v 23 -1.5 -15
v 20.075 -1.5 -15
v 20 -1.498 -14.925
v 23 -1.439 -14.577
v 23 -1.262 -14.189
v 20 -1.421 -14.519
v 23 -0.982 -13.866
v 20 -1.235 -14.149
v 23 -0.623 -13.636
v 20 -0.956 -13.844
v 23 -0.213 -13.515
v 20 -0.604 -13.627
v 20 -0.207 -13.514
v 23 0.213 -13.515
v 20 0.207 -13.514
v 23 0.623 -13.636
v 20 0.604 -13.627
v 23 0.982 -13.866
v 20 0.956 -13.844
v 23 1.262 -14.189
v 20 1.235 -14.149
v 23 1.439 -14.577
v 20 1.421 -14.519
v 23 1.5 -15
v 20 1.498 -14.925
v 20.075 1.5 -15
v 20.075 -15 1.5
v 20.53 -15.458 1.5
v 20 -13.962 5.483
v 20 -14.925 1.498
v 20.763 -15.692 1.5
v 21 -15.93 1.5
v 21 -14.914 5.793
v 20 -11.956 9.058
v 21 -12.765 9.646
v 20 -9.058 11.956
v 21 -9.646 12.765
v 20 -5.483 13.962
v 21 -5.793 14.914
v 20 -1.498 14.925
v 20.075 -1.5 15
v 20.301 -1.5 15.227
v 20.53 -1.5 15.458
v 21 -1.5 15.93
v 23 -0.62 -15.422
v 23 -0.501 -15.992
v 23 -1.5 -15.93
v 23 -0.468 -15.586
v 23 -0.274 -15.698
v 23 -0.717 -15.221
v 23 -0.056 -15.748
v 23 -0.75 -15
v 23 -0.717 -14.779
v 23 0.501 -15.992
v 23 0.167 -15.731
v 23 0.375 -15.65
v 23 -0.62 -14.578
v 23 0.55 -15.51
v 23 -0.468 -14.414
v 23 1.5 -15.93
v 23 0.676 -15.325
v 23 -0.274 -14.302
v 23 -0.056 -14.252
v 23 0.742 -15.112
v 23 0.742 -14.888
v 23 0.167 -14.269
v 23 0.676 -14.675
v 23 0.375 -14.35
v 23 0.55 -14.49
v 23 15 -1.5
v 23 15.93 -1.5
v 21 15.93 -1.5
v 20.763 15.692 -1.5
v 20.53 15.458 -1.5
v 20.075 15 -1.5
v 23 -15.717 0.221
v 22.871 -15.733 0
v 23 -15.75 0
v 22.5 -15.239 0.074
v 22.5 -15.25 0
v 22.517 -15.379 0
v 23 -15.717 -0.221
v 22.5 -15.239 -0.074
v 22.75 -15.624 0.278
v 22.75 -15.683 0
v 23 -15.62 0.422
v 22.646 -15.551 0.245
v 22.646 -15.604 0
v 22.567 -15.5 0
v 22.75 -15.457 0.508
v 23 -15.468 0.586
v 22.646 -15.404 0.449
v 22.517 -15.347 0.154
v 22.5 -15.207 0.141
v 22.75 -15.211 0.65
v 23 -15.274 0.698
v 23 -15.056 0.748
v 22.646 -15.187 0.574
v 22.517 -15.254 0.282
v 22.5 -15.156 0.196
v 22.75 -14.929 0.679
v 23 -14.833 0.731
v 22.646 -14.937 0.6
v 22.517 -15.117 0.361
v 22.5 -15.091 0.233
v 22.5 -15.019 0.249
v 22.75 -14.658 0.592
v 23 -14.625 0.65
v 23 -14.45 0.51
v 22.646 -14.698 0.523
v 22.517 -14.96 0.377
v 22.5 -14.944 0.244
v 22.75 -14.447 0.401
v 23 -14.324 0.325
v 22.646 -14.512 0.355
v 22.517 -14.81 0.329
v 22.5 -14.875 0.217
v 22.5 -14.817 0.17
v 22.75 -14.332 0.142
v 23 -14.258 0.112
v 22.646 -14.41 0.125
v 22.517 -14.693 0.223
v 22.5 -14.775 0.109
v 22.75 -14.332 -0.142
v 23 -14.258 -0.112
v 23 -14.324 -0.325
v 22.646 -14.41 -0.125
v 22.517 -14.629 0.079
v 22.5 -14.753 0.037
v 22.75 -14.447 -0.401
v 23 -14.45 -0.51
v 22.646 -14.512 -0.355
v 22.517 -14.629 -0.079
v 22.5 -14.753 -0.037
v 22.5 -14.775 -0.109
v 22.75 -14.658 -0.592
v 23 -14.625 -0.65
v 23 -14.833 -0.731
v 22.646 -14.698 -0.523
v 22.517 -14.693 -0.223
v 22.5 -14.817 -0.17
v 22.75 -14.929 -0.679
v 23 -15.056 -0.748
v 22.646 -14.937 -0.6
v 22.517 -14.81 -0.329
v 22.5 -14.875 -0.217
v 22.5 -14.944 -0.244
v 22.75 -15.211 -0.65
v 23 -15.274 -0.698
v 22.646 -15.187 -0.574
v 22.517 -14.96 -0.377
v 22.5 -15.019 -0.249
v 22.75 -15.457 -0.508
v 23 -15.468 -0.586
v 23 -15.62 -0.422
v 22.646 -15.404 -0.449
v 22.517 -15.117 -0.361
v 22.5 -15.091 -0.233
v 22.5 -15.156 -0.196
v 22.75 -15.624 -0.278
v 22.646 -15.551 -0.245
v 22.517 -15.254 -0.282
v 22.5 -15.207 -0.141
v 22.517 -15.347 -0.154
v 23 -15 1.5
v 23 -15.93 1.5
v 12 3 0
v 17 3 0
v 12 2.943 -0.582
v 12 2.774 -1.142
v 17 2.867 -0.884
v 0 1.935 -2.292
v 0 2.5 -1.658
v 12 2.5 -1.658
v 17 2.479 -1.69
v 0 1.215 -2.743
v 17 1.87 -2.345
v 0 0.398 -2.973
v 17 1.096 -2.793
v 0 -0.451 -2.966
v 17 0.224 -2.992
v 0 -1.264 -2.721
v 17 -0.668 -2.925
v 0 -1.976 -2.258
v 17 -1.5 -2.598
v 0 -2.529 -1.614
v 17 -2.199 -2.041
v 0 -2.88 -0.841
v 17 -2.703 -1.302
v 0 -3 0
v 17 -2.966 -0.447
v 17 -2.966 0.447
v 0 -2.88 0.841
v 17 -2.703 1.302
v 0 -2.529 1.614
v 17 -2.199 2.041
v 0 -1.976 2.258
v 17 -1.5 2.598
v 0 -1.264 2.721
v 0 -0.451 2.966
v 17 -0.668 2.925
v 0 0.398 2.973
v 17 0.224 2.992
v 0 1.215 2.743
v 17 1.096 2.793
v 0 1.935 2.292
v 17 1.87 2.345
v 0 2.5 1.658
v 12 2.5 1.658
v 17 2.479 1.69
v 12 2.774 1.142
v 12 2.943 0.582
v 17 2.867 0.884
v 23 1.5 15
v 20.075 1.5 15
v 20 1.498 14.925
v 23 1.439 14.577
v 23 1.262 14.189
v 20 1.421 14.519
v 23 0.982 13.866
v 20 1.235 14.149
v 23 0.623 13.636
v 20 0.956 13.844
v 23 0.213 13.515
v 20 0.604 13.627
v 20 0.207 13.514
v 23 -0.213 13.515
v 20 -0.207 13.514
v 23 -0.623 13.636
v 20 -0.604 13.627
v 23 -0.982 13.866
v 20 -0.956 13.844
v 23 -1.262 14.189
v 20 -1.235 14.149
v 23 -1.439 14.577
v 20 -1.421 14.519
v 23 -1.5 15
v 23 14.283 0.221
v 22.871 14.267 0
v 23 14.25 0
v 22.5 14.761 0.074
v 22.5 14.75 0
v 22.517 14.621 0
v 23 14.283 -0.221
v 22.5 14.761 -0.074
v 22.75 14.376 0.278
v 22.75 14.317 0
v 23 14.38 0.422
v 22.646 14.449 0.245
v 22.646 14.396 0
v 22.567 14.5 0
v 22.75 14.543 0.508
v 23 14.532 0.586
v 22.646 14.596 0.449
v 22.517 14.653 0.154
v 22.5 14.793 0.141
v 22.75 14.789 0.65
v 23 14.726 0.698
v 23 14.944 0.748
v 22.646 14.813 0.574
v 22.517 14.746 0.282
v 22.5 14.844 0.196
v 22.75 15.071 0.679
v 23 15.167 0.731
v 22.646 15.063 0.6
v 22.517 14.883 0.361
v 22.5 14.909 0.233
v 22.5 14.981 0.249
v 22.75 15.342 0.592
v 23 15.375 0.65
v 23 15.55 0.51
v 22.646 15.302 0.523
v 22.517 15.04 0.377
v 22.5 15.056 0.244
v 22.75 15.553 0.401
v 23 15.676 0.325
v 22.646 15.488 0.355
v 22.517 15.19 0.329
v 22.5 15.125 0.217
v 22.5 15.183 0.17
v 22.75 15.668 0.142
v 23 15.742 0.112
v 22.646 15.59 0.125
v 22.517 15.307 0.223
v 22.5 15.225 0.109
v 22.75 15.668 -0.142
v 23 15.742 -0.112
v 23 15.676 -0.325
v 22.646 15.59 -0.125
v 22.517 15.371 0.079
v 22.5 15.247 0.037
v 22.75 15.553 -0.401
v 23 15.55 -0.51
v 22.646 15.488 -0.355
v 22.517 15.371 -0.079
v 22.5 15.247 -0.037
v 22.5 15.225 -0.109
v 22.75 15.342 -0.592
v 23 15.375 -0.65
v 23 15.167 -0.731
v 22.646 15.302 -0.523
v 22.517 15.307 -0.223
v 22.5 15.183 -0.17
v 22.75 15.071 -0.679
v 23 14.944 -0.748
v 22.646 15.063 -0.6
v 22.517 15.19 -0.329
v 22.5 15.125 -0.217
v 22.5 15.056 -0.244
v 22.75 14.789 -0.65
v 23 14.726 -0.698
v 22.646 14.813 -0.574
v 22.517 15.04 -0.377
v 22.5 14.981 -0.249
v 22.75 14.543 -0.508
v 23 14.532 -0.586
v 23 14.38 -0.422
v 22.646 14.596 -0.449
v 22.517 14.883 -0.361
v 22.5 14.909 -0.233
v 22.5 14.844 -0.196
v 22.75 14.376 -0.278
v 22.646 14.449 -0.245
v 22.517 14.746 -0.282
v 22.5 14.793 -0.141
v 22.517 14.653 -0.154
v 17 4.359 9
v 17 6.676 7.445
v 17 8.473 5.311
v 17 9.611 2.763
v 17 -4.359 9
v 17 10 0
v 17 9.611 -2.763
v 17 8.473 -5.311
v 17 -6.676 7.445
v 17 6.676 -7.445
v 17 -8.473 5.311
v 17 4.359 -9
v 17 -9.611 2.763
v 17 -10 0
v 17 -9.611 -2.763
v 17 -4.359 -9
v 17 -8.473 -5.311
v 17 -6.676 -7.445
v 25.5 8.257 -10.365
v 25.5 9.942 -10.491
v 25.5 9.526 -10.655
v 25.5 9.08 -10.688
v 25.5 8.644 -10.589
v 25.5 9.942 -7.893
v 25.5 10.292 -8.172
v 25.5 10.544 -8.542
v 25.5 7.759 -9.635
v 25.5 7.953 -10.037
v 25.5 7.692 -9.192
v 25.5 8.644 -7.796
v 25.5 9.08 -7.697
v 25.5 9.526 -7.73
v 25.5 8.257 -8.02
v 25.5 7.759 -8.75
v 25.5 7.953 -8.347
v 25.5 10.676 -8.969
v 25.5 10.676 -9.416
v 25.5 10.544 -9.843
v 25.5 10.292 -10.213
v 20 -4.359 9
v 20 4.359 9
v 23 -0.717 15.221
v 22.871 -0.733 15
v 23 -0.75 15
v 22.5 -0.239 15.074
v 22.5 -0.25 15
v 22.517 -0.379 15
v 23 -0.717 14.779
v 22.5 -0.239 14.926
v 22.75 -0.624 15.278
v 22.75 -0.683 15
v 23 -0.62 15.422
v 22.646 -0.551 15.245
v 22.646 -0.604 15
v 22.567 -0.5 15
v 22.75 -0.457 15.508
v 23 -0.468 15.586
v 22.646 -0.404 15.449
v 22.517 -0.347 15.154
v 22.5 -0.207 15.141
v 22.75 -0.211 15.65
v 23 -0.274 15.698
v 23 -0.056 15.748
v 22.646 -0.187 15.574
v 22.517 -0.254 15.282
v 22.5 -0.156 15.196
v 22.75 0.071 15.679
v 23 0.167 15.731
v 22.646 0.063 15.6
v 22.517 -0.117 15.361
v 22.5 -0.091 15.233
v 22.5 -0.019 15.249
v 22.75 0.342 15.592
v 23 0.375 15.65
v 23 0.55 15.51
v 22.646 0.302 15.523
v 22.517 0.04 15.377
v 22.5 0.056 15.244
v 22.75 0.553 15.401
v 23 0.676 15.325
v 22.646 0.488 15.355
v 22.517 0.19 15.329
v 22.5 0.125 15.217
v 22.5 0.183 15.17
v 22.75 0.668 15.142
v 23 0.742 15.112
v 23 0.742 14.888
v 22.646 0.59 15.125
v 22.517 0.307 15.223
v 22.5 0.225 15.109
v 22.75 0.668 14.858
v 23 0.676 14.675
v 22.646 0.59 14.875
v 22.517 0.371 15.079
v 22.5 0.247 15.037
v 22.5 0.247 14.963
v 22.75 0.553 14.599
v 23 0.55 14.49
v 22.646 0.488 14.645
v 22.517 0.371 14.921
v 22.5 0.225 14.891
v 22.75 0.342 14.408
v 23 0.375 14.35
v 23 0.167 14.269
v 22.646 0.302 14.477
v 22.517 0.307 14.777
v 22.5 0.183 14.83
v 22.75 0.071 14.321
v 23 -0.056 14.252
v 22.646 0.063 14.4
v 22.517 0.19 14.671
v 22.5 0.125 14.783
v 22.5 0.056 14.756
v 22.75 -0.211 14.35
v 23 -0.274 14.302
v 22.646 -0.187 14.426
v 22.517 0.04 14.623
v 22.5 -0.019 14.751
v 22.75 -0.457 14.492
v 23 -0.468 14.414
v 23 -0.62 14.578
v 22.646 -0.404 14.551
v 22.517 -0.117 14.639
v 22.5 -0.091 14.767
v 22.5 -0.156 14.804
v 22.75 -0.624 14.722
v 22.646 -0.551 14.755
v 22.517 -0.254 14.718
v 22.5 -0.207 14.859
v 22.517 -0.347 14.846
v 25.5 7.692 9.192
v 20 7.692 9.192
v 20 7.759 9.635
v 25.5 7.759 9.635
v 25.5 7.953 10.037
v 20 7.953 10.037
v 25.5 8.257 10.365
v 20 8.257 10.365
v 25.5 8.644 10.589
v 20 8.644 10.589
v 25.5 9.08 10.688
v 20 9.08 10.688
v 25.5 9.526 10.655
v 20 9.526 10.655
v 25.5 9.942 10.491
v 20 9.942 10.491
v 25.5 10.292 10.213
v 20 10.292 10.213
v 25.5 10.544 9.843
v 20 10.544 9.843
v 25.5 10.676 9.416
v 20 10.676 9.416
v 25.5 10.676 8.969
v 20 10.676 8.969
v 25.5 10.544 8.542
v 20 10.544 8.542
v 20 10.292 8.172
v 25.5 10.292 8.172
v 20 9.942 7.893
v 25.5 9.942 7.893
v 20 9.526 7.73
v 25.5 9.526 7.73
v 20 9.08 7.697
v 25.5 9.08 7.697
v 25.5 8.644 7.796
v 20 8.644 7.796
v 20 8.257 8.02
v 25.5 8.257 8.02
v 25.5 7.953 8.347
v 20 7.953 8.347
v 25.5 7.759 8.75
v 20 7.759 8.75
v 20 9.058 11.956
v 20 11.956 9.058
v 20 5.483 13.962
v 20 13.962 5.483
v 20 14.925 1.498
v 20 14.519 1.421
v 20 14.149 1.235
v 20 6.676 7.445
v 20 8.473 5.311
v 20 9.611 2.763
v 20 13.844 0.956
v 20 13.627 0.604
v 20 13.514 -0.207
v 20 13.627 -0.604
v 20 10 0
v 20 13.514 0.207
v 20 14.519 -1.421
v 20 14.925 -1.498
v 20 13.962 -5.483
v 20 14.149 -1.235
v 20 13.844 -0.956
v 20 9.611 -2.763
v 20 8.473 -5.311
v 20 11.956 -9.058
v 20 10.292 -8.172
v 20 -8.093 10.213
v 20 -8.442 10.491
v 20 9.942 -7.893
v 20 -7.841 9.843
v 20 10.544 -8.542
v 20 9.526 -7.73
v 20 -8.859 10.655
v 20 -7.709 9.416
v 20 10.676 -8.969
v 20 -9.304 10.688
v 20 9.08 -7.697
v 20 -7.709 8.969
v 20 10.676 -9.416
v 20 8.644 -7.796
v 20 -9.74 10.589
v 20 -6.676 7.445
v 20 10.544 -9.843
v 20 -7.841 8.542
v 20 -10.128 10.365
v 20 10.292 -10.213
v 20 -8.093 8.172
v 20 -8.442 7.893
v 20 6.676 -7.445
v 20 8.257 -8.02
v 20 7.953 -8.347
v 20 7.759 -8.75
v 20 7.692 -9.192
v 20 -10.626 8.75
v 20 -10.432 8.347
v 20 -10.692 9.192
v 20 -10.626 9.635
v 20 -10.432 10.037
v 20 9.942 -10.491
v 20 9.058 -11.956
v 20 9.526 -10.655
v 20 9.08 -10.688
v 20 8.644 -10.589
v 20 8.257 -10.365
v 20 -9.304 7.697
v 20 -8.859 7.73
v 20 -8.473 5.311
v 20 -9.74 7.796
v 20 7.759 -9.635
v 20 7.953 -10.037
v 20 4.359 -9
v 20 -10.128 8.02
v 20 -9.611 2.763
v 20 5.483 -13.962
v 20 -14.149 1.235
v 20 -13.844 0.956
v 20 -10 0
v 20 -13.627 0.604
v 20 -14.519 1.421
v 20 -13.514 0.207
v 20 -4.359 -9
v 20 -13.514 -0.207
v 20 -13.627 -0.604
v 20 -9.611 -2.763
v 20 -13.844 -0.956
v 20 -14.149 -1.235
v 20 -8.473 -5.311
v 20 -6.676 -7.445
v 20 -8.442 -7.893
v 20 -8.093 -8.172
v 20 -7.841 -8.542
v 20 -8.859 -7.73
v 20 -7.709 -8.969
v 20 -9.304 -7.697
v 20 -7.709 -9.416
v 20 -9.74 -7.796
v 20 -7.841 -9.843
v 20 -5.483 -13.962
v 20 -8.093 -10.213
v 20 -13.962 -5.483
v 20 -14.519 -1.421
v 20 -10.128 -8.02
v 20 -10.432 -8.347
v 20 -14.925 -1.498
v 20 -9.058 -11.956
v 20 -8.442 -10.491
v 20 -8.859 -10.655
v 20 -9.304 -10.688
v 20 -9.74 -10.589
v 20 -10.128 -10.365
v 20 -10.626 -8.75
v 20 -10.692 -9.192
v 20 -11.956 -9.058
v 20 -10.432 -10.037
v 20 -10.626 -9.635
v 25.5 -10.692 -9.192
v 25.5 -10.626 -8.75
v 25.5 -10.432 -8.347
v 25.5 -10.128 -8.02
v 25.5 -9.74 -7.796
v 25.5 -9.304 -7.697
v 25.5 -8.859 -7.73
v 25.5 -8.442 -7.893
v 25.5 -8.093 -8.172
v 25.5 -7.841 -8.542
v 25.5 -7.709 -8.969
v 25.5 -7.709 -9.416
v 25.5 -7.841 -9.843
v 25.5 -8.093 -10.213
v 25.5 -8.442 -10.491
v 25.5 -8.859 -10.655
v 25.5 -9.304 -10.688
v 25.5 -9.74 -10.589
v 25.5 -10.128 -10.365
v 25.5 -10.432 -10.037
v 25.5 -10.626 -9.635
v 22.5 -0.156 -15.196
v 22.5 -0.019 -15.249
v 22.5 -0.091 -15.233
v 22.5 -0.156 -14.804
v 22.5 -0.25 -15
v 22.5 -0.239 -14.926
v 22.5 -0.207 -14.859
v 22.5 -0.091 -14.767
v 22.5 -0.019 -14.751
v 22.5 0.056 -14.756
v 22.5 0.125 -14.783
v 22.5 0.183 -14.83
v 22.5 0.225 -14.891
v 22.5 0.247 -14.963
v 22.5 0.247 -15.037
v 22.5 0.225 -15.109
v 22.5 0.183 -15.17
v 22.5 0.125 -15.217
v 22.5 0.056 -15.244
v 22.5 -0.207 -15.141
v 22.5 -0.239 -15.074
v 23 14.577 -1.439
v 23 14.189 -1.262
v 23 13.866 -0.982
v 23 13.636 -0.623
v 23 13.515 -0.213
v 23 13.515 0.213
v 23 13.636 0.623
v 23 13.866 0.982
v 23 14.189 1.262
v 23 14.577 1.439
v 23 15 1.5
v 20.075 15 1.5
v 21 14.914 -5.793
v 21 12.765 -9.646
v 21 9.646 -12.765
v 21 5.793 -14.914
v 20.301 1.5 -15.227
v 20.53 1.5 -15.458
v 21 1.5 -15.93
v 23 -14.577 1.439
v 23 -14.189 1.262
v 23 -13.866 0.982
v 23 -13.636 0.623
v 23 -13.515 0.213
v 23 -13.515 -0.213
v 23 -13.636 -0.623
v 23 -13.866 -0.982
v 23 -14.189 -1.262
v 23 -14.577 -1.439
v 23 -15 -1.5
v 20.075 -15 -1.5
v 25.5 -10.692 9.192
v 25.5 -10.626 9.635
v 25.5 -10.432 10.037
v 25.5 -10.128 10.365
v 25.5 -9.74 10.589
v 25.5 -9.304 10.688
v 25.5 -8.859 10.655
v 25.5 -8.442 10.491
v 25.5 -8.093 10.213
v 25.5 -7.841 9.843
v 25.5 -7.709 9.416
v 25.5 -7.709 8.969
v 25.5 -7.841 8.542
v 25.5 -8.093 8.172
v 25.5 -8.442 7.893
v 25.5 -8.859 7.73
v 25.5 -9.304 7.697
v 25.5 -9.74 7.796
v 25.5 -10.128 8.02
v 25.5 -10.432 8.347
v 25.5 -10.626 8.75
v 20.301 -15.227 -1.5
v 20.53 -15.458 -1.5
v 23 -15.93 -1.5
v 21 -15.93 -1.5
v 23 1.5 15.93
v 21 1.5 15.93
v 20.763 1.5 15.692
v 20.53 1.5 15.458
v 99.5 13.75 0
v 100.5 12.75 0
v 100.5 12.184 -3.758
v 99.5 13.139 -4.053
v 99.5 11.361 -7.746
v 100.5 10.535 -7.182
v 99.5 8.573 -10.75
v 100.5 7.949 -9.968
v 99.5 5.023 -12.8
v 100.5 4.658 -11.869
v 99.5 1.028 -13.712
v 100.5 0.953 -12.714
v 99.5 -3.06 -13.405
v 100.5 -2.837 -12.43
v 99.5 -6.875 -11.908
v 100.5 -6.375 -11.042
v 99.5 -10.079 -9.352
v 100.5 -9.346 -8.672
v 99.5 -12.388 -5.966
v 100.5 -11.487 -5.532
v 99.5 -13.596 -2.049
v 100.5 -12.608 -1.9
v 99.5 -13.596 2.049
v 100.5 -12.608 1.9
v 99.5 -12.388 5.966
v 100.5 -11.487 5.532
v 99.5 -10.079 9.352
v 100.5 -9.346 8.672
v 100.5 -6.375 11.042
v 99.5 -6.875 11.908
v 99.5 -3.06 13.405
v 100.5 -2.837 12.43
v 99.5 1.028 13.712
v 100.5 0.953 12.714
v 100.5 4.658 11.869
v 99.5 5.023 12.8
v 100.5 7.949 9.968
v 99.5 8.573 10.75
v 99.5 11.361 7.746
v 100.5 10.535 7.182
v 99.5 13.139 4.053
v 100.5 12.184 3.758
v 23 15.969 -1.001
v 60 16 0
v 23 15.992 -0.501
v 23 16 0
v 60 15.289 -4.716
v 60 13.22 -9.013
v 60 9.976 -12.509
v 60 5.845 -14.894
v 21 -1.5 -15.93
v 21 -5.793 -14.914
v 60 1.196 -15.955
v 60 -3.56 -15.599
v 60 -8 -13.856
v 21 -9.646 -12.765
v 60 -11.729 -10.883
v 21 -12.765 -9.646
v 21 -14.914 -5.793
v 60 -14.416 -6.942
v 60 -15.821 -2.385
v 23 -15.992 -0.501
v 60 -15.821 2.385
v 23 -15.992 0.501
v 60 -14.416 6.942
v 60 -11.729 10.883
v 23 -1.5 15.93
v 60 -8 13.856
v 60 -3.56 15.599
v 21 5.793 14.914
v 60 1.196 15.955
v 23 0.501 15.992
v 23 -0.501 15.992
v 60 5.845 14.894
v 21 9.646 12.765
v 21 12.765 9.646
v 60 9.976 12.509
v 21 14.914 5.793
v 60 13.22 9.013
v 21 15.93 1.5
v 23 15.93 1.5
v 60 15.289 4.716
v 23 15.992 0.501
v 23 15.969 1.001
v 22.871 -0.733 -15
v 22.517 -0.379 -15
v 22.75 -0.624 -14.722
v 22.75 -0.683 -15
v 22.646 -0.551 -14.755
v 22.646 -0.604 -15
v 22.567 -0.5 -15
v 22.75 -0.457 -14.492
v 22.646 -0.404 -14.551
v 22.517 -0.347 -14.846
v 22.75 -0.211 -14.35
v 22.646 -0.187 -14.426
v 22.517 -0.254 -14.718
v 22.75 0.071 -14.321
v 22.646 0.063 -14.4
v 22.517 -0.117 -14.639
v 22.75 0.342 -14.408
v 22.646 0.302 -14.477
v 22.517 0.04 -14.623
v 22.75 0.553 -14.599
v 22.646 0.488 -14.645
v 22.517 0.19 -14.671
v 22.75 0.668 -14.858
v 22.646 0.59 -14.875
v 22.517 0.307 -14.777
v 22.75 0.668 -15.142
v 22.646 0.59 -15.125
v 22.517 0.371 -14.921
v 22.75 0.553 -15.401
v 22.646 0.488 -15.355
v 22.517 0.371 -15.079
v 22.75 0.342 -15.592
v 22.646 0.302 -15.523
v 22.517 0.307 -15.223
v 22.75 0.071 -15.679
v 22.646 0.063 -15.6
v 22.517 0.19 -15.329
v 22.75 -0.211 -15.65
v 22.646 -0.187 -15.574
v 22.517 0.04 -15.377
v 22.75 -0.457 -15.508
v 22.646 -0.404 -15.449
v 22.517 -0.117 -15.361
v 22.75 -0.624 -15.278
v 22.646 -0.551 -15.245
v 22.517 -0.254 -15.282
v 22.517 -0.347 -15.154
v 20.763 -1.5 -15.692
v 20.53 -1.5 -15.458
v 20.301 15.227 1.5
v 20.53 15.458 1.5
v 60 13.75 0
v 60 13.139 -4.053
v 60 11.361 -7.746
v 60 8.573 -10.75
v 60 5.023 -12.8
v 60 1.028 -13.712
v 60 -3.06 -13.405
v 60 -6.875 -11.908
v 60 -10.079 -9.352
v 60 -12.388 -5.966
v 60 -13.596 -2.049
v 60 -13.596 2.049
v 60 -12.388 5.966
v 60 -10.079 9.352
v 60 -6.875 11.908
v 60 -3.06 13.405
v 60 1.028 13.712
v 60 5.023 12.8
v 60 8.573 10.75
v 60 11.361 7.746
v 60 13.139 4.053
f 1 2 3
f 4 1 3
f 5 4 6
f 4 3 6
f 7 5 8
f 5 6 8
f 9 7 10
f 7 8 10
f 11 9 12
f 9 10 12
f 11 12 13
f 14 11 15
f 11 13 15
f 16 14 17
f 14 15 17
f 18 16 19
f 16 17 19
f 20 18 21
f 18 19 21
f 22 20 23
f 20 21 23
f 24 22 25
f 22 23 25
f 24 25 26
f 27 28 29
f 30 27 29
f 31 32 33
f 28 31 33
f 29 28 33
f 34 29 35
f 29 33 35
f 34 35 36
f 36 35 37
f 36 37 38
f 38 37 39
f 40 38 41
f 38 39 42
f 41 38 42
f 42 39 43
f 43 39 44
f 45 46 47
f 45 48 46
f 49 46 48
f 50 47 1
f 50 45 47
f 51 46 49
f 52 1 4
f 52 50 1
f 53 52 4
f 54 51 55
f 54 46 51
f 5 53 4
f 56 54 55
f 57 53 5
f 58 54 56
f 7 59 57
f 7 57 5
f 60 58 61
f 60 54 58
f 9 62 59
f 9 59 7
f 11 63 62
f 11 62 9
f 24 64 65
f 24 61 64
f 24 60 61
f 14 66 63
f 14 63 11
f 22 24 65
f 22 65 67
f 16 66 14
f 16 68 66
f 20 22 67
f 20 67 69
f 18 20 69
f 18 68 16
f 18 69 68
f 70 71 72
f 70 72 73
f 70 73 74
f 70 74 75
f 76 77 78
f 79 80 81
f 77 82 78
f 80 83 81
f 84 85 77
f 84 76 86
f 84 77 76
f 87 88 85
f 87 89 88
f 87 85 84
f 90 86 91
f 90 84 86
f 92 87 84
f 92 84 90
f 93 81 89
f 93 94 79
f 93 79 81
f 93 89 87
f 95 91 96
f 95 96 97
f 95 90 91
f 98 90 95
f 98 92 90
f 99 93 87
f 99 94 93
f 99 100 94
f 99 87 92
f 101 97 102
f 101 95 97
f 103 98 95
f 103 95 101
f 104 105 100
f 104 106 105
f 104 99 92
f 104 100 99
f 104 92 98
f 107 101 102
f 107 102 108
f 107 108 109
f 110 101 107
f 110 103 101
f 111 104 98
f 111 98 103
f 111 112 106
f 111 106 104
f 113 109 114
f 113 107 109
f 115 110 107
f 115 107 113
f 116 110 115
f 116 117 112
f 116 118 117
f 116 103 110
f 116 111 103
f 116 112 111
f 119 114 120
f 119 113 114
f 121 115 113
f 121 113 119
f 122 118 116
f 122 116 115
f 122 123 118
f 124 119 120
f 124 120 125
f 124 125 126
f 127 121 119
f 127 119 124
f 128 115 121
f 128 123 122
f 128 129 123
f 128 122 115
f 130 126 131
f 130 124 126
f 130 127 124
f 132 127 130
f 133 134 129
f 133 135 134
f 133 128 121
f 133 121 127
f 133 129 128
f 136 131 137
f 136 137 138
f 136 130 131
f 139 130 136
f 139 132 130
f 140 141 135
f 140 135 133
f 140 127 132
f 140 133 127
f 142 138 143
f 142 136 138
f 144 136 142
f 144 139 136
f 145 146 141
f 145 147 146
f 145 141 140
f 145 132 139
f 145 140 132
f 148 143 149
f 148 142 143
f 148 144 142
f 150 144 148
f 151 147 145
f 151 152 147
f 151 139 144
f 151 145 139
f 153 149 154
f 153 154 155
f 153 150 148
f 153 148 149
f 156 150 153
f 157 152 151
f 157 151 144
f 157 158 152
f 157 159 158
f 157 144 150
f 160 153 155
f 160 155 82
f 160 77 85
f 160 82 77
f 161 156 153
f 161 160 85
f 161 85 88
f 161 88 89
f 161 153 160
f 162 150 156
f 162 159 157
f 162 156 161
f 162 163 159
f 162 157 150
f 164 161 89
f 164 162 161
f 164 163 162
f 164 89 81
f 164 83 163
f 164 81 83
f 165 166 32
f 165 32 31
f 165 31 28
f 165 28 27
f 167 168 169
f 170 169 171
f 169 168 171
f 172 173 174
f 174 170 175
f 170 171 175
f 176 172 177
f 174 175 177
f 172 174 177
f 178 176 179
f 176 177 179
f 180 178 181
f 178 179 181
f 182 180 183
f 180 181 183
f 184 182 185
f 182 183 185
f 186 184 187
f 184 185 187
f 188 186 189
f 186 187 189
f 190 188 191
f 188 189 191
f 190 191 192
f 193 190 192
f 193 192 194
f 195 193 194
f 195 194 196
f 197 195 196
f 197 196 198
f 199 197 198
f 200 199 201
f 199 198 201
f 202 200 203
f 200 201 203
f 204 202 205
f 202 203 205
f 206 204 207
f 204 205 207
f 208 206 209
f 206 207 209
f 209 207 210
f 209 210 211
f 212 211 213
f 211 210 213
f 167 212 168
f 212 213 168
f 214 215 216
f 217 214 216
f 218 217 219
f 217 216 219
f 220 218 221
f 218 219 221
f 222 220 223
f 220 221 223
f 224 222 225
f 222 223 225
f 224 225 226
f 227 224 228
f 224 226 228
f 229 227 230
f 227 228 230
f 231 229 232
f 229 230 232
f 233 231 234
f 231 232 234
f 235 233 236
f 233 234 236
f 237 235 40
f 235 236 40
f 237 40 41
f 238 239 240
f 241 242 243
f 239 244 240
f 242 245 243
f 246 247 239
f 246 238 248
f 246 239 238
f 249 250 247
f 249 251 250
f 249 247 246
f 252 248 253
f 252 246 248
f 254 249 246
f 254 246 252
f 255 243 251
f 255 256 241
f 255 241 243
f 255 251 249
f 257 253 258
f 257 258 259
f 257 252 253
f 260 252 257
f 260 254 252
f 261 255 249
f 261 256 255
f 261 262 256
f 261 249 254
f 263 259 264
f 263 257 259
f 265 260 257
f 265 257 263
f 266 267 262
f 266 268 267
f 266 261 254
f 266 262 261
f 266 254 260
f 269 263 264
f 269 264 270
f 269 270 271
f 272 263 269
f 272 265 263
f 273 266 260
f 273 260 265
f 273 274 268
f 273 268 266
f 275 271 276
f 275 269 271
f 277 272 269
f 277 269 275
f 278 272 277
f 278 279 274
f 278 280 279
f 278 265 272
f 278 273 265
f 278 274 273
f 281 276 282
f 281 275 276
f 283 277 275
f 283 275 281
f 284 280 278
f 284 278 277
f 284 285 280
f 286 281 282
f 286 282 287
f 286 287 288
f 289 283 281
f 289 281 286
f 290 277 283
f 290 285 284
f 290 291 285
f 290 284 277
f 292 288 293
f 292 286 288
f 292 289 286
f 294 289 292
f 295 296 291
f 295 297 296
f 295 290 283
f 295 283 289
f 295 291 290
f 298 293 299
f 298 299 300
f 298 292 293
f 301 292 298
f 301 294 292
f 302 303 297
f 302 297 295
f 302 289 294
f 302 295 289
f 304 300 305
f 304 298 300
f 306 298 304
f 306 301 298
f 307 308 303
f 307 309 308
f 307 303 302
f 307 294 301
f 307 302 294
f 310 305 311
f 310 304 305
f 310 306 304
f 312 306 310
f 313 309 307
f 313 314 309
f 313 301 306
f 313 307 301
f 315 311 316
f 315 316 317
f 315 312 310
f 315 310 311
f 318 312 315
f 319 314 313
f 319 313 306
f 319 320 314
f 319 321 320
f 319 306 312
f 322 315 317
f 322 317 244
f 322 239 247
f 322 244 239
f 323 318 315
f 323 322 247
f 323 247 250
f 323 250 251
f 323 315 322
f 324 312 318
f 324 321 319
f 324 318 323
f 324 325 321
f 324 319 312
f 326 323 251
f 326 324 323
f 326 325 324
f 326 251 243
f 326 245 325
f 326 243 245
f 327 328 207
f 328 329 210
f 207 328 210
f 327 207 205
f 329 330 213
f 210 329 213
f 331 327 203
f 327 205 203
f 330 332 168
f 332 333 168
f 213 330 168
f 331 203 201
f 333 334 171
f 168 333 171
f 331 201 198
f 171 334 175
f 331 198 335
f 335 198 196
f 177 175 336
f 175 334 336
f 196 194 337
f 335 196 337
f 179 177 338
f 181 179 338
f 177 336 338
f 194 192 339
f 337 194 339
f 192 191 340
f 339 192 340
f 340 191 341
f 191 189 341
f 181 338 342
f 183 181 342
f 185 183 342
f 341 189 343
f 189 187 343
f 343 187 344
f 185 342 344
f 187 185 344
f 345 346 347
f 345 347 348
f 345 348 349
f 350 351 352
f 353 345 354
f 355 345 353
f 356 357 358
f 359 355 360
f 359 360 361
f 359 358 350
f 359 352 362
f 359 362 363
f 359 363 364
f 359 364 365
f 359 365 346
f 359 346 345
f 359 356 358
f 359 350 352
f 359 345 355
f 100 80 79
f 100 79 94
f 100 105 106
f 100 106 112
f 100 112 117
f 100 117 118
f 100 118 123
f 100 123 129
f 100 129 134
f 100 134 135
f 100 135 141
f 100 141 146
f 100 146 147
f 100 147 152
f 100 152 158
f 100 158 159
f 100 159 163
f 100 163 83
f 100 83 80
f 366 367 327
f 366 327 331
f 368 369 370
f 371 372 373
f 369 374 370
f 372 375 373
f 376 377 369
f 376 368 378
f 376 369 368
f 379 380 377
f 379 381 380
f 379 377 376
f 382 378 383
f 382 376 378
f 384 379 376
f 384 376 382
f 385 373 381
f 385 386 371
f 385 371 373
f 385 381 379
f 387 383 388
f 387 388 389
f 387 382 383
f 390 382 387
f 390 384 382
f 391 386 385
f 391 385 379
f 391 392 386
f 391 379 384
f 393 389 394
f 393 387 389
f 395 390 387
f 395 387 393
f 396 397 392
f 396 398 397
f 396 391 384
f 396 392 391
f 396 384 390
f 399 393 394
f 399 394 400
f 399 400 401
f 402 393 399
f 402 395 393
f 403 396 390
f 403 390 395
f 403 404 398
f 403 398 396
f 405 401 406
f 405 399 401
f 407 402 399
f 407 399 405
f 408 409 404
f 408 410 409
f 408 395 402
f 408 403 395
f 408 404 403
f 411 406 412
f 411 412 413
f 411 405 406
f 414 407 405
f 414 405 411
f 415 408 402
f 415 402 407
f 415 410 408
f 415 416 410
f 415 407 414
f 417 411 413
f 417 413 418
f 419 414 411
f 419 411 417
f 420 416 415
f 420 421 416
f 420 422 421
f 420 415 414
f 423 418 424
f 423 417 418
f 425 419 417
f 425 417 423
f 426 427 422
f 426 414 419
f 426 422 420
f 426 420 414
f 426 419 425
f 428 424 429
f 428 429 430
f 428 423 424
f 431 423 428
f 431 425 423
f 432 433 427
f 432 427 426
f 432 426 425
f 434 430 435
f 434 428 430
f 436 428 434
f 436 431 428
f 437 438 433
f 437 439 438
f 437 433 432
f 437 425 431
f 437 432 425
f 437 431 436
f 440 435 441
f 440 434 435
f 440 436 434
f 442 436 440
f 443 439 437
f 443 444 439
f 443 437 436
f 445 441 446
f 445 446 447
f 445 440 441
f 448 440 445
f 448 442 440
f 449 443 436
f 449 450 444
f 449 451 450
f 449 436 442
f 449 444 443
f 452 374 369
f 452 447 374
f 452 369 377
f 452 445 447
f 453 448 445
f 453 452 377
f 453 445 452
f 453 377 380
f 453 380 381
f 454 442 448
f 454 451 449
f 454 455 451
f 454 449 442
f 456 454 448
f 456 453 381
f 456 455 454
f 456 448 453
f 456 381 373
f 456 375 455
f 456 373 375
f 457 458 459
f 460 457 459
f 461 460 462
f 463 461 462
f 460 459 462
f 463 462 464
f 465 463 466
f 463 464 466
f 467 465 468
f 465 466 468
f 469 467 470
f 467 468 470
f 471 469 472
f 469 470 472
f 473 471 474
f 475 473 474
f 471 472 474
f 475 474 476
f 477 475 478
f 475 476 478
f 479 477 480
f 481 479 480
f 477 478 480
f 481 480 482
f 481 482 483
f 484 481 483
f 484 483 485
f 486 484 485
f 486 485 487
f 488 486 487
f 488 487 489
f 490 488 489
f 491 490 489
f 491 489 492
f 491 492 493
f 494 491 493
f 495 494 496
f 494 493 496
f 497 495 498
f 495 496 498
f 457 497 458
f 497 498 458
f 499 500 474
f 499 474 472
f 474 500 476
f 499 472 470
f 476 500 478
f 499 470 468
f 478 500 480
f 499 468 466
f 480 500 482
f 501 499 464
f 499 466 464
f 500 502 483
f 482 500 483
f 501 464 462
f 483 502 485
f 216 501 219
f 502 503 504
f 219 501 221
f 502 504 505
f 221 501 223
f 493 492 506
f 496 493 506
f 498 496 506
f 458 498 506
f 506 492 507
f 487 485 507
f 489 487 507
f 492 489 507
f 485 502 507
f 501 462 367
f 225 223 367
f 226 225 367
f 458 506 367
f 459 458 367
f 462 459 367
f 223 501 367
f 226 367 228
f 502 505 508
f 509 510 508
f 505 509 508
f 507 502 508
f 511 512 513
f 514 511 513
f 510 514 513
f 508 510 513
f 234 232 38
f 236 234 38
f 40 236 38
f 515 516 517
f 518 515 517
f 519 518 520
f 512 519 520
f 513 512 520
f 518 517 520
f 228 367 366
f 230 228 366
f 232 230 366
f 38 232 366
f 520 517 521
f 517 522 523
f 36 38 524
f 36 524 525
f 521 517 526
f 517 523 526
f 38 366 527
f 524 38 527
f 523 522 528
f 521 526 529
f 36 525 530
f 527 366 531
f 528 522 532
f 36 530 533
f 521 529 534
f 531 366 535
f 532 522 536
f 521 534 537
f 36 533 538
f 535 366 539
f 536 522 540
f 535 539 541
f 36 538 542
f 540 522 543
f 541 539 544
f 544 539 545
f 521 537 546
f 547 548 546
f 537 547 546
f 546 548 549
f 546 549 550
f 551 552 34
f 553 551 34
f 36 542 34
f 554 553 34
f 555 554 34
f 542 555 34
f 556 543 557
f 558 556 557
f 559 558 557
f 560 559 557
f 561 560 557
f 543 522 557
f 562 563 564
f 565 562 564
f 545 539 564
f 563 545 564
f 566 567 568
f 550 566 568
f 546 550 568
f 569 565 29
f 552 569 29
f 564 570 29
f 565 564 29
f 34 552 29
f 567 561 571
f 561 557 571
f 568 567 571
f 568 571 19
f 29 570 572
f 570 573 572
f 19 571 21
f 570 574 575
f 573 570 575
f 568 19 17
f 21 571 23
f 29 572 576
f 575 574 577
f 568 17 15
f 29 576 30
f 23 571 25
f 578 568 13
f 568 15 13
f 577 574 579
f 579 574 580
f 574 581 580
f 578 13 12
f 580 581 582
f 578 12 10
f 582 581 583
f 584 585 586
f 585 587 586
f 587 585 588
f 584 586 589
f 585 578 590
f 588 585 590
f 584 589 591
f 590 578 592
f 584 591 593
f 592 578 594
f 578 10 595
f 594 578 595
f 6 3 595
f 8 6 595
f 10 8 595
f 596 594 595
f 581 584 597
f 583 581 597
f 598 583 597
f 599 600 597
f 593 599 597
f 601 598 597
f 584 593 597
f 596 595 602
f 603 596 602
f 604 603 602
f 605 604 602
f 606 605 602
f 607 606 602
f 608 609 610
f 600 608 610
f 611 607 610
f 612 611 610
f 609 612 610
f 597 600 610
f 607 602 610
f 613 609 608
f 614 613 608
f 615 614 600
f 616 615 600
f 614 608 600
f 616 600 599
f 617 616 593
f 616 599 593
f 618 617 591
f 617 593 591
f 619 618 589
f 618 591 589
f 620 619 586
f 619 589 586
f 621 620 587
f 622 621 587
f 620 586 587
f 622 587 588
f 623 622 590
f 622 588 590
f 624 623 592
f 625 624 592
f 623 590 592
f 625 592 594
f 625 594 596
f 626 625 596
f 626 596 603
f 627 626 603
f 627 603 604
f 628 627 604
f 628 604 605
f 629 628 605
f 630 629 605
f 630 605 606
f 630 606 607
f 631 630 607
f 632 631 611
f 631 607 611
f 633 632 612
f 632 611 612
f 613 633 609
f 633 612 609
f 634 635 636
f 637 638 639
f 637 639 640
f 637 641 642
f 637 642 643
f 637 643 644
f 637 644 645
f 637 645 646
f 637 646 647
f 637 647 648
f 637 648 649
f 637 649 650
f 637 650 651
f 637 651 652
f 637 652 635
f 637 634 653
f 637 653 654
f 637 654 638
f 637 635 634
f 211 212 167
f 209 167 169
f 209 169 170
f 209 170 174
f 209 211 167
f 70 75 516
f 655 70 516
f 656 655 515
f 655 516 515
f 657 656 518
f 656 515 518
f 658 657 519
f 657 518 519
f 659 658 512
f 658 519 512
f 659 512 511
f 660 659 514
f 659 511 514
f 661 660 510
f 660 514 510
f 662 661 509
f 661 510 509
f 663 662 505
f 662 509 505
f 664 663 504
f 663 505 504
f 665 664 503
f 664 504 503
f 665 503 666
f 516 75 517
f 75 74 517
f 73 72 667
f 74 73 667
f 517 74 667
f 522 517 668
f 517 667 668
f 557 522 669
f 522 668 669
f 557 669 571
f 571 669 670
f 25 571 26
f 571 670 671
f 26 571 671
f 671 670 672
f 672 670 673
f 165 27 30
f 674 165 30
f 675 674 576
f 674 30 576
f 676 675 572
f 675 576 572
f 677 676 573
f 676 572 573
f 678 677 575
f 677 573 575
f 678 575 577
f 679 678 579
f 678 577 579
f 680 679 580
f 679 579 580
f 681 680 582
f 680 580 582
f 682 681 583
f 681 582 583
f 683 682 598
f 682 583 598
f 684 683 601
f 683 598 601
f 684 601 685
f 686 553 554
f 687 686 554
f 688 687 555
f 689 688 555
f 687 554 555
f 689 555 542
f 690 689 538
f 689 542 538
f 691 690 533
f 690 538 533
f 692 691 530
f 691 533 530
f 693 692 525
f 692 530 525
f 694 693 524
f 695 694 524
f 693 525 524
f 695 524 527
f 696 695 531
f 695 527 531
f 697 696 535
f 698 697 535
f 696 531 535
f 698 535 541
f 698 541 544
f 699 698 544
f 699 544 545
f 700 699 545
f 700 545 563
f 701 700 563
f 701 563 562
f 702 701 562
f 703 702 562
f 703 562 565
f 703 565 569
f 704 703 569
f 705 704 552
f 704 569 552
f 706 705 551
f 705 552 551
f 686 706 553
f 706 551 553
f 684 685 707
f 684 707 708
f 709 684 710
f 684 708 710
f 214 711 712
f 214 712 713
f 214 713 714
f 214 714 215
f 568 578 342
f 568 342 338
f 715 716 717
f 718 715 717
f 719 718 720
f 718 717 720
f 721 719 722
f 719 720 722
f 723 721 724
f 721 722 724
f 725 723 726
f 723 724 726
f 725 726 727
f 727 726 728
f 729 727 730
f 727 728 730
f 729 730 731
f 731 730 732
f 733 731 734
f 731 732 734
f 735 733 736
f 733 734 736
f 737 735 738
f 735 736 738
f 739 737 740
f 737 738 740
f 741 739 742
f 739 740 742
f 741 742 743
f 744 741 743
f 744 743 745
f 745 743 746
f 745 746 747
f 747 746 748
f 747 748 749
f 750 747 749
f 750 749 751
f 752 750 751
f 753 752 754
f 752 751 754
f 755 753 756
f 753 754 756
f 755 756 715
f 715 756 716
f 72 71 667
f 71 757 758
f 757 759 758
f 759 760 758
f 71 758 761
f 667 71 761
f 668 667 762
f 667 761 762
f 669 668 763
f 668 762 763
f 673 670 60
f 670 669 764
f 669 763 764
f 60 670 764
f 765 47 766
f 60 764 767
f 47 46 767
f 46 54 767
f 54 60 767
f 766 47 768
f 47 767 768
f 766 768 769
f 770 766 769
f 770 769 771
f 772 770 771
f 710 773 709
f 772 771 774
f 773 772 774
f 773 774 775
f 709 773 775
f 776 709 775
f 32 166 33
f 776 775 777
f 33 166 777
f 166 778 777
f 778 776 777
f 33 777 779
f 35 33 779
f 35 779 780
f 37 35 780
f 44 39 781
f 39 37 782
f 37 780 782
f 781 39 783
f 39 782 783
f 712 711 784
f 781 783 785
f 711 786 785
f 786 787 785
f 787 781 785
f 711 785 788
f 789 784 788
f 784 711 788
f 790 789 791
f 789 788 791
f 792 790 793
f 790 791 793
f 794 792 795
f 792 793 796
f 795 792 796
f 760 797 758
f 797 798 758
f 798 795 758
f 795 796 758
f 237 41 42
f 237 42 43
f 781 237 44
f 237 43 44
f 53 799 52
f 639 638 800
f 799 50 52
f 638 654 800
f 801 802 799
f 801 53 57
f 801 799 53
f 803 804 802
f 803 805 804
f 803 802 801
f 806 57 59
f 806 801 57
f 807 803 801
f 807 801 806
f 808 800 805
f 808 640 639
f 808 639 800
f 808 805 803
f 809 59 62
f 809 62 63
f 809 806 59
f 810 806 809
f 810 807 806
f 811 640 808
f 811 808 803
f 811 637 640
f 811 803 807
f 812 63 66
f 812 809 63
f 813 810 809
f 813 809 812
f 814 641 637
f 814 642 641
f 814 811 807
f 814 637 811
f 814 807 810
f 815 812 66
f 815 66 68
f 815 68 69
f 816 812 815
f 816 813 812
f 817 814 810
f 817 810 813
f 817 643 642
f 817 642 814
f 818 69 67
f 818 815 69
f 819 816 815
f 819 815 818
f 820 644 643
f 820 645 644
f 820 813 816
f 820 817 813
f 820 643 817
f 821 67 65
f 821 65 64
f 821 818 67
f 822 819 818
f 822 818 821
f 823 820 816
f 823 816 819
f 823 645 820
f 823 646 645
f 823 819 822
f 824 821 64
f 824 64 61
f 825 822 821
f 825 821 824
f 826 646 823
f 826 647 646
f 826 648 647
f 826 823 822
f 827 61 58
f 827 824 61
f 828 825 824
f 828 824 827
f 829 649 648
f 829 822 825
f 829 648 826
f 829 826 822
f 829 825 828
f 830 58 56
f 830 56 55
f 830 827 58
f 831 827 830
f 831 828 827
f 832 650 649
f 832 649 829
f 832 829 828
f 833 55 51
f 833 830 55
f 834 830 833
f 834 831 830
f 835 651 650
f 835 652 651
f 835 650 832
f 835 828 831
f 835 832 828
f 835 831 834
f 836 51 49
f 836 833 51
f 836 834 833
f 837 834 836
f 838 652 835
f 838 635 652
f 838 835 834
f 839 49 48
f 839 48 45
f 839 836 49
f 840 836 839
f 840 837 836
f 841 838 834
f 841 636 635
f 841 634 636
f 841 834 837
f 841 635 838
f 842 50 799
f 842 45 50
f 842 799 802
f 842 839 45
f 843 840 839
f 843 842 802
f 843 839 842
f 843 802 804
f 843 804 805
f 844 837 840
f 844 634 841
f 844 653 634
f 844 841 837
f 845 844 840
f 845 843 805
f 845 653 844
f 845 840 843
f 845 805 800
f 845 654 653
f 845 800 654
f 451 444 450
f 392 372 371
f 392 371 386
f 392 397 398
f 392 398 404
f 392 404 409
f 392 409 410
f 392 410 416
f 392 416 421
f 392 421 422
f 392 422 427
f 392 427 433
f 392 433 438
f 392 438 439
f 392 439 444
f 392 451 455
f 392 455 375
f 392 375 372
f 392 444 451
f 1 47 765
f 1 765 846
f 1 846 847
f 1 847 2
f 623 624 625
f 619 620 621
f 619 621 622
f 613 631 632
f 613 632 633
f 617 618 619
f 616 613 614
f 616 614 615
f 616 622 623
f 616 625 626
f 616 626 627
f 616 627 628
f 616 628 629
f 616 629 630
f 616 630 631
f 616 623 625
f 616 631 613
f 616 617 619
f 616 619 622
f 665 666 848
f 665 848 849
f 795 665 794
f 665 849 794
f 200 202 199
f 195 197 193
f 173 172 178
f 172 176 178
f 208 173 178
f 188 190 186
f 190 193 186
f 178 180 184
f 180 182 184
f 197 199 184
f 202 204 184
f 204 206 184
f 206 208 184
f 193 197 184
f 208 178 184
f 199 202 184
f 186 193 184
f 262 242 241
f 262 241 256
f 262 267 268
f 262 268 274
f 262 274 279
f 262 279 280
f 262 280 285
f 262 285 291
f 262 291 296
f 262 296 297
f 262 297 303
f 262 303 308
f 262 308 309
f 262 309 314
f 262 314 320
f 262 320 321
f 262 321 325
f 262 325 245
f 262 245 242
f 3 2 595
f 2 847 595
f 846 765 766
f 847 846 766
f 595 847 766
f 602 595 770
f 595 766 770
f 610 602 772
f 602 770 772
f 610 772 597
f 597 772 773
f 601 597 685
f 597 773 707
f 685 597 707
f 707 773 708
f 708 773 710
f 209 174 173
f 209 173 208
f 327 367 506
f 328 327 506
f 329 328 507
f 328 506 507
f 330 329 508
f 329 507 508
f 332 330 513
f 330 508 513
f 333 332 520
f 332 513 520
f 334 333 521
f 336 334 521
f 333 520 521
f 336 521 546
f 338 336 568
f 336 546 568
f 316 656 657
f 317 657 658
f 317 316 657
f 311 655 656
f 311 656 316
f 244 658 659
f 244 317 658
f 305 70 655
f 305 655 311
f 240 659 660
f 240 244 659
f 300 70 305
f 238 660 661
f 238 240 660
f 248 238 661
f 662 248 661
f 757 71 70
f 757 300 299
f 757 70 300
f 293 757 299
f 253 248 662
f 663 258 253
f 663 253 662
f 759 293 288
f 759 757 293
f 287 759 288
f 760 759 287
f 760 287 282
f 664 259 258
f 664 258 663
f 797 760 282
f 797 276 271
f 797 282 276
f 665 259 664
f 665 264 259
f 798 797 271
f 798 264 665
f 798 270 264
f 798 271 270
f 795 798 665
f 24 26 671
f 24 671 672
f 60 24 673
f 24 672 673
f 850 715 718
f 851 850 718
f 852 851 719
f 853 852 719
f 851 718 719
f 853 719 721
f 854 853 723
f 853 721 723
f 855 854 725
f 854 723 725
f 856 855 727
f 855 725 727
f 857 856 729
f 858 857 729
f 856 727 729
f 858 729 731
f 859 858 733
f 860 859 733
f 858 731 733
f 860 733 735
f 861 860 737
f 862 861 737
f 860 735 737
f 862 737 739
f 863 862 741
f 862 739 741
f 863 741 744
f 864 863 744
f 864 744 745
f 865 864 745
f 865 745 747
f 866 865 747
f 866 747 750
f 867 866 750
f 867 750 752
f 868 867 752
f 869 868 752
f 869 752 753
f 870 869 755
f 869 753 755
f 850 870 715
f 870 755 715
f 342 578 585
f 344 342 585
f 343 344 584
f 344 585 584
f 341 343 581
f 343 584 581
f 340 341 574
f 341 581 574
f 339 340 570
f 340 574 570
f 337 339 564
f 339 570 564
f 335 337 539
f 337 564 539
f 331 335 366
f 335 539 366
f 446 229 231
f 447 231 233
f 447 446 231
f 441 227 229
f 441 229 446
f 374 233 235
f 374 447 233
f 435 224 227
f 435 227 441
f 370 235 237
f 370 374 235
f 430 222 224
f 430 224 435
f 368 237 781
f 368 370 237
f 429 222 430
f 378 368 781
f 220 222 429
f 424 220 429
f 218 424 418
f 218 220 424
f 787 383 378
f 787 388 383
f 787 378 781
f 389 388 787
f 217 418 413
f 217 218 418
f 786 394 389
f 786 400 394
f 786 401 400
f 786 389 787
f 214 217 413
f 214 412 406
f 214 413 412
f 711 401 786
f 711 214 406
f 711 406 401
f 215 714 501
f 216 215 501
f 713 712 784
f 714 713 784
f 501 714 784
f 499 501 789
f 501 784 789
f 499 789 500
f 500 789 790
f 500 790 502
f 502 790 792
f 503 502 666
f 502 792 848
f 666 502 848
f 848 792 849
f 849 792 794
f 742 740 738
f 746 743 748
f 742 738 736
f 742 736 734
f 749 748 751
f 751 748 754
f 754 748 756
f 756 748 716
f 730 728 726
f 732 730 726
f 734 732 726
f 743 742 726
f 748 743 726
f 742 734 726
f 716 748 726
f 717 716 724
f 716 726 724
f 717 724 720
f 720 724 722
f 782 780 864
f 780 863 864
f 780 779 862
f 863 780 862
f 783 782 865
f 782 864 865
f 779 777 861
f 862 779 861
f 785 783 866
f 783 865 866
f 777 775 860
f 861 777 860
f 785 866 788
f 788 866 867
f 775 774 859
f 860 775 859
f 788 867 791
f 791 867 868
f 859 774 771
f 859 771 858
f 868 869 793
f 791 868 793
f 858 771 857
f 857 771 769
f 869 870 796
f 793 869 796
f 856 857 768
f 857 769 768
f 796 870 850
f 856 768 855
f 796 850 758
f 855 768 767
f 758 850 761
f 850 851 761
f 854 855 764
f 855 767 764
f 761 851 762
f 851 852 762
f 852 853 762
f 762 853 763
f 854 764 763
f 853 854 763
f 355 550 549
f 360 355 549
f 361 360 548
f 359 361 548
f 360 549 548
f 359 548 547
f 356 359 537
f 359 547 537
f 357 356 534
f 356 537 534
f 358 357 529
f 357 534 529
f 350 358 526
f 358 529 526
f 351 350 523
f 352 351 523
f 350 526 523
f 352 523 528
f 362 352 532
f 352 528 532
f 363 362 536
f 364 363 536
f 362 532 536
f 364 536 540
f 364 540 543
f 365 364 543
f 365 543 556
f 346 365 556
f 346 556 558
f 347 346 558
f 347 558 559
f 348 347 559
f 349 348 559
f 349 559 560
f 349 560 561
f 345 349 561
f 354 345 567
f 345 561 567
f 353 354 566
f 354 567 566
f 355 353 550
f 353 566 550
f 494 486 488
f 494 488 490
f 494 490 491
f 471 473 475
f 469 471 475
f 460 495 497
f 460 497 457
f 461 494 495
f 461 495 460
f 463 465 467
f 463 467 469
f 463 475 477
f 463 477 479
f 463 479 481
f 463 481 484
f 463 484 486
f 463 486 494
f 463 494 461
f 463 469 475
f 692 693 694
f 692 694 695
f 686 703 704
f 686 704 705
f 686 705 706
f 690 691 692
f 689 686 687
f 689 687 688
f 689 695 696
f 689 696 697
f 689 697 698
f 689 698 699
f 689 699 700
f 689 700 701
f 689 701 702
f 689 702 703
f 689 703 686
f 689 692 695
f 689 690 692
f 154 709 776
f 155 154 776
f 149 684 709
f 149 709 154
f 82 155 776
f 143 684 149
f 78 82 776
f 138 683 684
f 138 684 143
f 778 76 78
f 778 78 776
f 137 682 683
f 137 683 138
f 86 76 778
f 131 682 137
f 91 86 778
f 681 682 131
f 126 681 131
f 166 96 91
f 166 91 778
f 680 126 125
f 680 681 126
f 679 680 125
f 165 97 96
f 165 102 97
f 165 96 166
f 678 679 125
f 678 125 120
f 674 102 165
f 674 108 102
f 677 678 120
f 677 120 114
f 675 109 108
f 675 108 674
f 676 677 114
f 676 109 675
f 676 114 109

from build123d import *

# Parameters (mm, degrees)
ENL_V_START             = -12
ENL_V_MAT_EXTRU_1_DEPTH = 12
ENL_V_START_2           = -3
ENL_V_MAT_EXTRU_2_DEPTH = 3
CHANFREIN1_SIZE         = 1
ENL_V_MAT_EXTRU_3_DEPTH = 3
ESQUISSE5_R             = 0.75
BOSS_EXTRU_1_DEPTH      = 0.5
CONG_1_R                = 0.5
ESQUISSE6_R             = 1.5
ENL_V_MAT_EXTRU_4_DEPTH = 5.5
CHANFREIN2_SIZE         = 1


with BuildPart() as part:
    # Esquisse1 → Révolution1 (revolve)
    with BuildSketch(Plane.XY):
        Polygon((0, 0), (0, 3), (17, 3), (17, 10), (20, 10), (20, 16), (60, 16), (60, 13.75), (100.5, 13.75), (100.5, 0), align=None)
    revolve(axis=Axis((100.5, 0, 0), (-1, 0, 0)))

    # Esquisse2 → Enlèv. mat.-Extru.1 (cut)
    with BuildSketch(Plane.ZY.offset(ENL_V_START)):
        with BuildLine():
            Line((-1.658312395, 2.5), (1.658312395, 2.5))
            ThreePointArc((1.658312395, 2.5), (0, 3), (-1.658312395, 2.5))
        make_face()
    extrude(amount=ENL_V_MAT_EXTRU_1_DEPTH, mode=Mode.SUBTRACT)

    # Esquisse3 → Enlèv. mat.-Extru.2 (cut)
    with BuildSketch(Plane.ZY.offset(-17).offset(ENL_V_START_2)):
        with BuildLine():
            ThreePointArc((-9, 4.358898944), (-10, 0), (-9, -4.358898944))
            Line((-9, -4.358898944), (-9, 4.358898944))
        make_face()
        with BuildLine():
            Line((9, 4.358898944), (9, -4.358898944))
            ThreePointArc((9, -4.358898944), (9.746794345, -2.236067977), (10, 0))
            ThreePointArc((10, 0), (9.746794345, 2.236067977), (9, 4.358898944))
        make_face()
    extrude(amount=ENL_V_MAT_EXTRU_2_DEPTH, mode=Mode.SUBTRACT)

    # Chanfrein1
    chanfrein1_edges = [part.edges().sort_by_distance(p)[0] for p in [
        (20, -16, 0),
    ]]
    chamfer(chanfrein1_edges, length=CHANFREIN1_SIZE)

    # Esquisse4 → Enlèv. mat.-Extru.3 (cut)
    with BuildSketch(Plane.ZY.offset(-20)):
        with BuildLine():
            Line((16, 1.5), (15, 1.5))
            ThreePointArc((15, 1.5), (13.5, 0), (15, -1.5))
            Line((15, -1.5), (16, -1.5))
            Line((16, -1.5), (16, 1.5))
        make_face()
        with BuildLine():
            Line((1.5, -16), (1.5, -15))
            ThreePointArc((1.5, -15), (0, -13.5), (-1.5, -15))
            Line((-1.5, -15), (-1.5, -16))
            Line((-1.5, -16), (1.5, -16))
        make_face()
        with BuildLine():
            Line((-16, -1.5), (-15, -1.5))
            ThreePointArc((-15, -1.5), (-13.5, 0), (-15, 1.5))
            Line((-15, 1.5), (-16, 1.5))
            Line((-16, 1.5), (-16, -1.5))
        make_face()
        with BuildLine():
            Line((-1.5, 16), (-1.5, 15))
            ThreePointArc((-1.5, 15), (0, 13.5), (1.5, 15))
            Line((1.5, 15), (1.5, 16))
            Line((1.5, 16), (-1.5, 16))
        make_face()
    extrude(amount=-ENL_V_MAT_EXTRU_3_DEPTH, mode=Mode.SUBTRACT)

    # Esquisse5 → Boss.-Extru.1 (add)
    with BuildSketch(Plane.ZY.offset(-23)):
        with Locations(Location((0, 15, 0), (0, 0, 270))):
            Circle(ESQUISSE5_R)
        with Locations(Location((15, 0, 0), (0, 0, 270))):
            Circle(ESQUISSE5_R)
        with Locations(Location((0, -15, 0), (0, 0, 270))):
            Circle(ESQUISSE5_R)
        with Locations(Location((-15, 0, 0), (0, 0, 270))):
            Circle(ESQUISSE5_R)
    extrude(amount=BOSS_EXTRU_1_DEPTH)

    # Congé1
    cong_1_edges = [part.edges().sort_by_distance(p)[0] for p in [
        (22.5, 15.75, 0),
        (22.5, 0.75, 15),
        (22.5, -14.25, 0),
        (22.5, 0.75, -15),
    ]]
    fillet(cong_1_edges, radius=CONG_1_R - 0.0001)  # a hair under: the kernel refuses the full size

    # Esquisse6 → Enlèv. mat.-Extru.4 (cut)
    with BuildSketch(Plane.ZY.offset(-20)):
        with Locations(Location((9.192388155, 9.192388155, 0), (0, 0, 270))):
            Circle(ESQUISSE6_R)
        with Locations(Location((9.192388155, -9.192388155, 0), (0, 0, 270))):
            Circle(ESQUISSE6_R)
        with Locations(Location((-9.192388155, -9.192388155, 0), (0, 0, 270))):
            Circle(ESQUISSE6_R)
        with Locations(Location((-9.192388155, 9.192388155, 0), (0, 0, 270))):
            Circle(ESQUISSE6_R)
    extrude(amount=-ENL_V_MAT_EXTRU_4_DEPTH, mode=Mode.SUBTRACT)

    # Chanfrein2
    chanfrein2_edges = [part.edges().sort_by_distance(p)[0] for p in [
        (100.5, -13.75, 0),
    ]]
    chamfer(chanfrein2_edges, length=CHANFREIN2_SIZE)


solid = part.part
